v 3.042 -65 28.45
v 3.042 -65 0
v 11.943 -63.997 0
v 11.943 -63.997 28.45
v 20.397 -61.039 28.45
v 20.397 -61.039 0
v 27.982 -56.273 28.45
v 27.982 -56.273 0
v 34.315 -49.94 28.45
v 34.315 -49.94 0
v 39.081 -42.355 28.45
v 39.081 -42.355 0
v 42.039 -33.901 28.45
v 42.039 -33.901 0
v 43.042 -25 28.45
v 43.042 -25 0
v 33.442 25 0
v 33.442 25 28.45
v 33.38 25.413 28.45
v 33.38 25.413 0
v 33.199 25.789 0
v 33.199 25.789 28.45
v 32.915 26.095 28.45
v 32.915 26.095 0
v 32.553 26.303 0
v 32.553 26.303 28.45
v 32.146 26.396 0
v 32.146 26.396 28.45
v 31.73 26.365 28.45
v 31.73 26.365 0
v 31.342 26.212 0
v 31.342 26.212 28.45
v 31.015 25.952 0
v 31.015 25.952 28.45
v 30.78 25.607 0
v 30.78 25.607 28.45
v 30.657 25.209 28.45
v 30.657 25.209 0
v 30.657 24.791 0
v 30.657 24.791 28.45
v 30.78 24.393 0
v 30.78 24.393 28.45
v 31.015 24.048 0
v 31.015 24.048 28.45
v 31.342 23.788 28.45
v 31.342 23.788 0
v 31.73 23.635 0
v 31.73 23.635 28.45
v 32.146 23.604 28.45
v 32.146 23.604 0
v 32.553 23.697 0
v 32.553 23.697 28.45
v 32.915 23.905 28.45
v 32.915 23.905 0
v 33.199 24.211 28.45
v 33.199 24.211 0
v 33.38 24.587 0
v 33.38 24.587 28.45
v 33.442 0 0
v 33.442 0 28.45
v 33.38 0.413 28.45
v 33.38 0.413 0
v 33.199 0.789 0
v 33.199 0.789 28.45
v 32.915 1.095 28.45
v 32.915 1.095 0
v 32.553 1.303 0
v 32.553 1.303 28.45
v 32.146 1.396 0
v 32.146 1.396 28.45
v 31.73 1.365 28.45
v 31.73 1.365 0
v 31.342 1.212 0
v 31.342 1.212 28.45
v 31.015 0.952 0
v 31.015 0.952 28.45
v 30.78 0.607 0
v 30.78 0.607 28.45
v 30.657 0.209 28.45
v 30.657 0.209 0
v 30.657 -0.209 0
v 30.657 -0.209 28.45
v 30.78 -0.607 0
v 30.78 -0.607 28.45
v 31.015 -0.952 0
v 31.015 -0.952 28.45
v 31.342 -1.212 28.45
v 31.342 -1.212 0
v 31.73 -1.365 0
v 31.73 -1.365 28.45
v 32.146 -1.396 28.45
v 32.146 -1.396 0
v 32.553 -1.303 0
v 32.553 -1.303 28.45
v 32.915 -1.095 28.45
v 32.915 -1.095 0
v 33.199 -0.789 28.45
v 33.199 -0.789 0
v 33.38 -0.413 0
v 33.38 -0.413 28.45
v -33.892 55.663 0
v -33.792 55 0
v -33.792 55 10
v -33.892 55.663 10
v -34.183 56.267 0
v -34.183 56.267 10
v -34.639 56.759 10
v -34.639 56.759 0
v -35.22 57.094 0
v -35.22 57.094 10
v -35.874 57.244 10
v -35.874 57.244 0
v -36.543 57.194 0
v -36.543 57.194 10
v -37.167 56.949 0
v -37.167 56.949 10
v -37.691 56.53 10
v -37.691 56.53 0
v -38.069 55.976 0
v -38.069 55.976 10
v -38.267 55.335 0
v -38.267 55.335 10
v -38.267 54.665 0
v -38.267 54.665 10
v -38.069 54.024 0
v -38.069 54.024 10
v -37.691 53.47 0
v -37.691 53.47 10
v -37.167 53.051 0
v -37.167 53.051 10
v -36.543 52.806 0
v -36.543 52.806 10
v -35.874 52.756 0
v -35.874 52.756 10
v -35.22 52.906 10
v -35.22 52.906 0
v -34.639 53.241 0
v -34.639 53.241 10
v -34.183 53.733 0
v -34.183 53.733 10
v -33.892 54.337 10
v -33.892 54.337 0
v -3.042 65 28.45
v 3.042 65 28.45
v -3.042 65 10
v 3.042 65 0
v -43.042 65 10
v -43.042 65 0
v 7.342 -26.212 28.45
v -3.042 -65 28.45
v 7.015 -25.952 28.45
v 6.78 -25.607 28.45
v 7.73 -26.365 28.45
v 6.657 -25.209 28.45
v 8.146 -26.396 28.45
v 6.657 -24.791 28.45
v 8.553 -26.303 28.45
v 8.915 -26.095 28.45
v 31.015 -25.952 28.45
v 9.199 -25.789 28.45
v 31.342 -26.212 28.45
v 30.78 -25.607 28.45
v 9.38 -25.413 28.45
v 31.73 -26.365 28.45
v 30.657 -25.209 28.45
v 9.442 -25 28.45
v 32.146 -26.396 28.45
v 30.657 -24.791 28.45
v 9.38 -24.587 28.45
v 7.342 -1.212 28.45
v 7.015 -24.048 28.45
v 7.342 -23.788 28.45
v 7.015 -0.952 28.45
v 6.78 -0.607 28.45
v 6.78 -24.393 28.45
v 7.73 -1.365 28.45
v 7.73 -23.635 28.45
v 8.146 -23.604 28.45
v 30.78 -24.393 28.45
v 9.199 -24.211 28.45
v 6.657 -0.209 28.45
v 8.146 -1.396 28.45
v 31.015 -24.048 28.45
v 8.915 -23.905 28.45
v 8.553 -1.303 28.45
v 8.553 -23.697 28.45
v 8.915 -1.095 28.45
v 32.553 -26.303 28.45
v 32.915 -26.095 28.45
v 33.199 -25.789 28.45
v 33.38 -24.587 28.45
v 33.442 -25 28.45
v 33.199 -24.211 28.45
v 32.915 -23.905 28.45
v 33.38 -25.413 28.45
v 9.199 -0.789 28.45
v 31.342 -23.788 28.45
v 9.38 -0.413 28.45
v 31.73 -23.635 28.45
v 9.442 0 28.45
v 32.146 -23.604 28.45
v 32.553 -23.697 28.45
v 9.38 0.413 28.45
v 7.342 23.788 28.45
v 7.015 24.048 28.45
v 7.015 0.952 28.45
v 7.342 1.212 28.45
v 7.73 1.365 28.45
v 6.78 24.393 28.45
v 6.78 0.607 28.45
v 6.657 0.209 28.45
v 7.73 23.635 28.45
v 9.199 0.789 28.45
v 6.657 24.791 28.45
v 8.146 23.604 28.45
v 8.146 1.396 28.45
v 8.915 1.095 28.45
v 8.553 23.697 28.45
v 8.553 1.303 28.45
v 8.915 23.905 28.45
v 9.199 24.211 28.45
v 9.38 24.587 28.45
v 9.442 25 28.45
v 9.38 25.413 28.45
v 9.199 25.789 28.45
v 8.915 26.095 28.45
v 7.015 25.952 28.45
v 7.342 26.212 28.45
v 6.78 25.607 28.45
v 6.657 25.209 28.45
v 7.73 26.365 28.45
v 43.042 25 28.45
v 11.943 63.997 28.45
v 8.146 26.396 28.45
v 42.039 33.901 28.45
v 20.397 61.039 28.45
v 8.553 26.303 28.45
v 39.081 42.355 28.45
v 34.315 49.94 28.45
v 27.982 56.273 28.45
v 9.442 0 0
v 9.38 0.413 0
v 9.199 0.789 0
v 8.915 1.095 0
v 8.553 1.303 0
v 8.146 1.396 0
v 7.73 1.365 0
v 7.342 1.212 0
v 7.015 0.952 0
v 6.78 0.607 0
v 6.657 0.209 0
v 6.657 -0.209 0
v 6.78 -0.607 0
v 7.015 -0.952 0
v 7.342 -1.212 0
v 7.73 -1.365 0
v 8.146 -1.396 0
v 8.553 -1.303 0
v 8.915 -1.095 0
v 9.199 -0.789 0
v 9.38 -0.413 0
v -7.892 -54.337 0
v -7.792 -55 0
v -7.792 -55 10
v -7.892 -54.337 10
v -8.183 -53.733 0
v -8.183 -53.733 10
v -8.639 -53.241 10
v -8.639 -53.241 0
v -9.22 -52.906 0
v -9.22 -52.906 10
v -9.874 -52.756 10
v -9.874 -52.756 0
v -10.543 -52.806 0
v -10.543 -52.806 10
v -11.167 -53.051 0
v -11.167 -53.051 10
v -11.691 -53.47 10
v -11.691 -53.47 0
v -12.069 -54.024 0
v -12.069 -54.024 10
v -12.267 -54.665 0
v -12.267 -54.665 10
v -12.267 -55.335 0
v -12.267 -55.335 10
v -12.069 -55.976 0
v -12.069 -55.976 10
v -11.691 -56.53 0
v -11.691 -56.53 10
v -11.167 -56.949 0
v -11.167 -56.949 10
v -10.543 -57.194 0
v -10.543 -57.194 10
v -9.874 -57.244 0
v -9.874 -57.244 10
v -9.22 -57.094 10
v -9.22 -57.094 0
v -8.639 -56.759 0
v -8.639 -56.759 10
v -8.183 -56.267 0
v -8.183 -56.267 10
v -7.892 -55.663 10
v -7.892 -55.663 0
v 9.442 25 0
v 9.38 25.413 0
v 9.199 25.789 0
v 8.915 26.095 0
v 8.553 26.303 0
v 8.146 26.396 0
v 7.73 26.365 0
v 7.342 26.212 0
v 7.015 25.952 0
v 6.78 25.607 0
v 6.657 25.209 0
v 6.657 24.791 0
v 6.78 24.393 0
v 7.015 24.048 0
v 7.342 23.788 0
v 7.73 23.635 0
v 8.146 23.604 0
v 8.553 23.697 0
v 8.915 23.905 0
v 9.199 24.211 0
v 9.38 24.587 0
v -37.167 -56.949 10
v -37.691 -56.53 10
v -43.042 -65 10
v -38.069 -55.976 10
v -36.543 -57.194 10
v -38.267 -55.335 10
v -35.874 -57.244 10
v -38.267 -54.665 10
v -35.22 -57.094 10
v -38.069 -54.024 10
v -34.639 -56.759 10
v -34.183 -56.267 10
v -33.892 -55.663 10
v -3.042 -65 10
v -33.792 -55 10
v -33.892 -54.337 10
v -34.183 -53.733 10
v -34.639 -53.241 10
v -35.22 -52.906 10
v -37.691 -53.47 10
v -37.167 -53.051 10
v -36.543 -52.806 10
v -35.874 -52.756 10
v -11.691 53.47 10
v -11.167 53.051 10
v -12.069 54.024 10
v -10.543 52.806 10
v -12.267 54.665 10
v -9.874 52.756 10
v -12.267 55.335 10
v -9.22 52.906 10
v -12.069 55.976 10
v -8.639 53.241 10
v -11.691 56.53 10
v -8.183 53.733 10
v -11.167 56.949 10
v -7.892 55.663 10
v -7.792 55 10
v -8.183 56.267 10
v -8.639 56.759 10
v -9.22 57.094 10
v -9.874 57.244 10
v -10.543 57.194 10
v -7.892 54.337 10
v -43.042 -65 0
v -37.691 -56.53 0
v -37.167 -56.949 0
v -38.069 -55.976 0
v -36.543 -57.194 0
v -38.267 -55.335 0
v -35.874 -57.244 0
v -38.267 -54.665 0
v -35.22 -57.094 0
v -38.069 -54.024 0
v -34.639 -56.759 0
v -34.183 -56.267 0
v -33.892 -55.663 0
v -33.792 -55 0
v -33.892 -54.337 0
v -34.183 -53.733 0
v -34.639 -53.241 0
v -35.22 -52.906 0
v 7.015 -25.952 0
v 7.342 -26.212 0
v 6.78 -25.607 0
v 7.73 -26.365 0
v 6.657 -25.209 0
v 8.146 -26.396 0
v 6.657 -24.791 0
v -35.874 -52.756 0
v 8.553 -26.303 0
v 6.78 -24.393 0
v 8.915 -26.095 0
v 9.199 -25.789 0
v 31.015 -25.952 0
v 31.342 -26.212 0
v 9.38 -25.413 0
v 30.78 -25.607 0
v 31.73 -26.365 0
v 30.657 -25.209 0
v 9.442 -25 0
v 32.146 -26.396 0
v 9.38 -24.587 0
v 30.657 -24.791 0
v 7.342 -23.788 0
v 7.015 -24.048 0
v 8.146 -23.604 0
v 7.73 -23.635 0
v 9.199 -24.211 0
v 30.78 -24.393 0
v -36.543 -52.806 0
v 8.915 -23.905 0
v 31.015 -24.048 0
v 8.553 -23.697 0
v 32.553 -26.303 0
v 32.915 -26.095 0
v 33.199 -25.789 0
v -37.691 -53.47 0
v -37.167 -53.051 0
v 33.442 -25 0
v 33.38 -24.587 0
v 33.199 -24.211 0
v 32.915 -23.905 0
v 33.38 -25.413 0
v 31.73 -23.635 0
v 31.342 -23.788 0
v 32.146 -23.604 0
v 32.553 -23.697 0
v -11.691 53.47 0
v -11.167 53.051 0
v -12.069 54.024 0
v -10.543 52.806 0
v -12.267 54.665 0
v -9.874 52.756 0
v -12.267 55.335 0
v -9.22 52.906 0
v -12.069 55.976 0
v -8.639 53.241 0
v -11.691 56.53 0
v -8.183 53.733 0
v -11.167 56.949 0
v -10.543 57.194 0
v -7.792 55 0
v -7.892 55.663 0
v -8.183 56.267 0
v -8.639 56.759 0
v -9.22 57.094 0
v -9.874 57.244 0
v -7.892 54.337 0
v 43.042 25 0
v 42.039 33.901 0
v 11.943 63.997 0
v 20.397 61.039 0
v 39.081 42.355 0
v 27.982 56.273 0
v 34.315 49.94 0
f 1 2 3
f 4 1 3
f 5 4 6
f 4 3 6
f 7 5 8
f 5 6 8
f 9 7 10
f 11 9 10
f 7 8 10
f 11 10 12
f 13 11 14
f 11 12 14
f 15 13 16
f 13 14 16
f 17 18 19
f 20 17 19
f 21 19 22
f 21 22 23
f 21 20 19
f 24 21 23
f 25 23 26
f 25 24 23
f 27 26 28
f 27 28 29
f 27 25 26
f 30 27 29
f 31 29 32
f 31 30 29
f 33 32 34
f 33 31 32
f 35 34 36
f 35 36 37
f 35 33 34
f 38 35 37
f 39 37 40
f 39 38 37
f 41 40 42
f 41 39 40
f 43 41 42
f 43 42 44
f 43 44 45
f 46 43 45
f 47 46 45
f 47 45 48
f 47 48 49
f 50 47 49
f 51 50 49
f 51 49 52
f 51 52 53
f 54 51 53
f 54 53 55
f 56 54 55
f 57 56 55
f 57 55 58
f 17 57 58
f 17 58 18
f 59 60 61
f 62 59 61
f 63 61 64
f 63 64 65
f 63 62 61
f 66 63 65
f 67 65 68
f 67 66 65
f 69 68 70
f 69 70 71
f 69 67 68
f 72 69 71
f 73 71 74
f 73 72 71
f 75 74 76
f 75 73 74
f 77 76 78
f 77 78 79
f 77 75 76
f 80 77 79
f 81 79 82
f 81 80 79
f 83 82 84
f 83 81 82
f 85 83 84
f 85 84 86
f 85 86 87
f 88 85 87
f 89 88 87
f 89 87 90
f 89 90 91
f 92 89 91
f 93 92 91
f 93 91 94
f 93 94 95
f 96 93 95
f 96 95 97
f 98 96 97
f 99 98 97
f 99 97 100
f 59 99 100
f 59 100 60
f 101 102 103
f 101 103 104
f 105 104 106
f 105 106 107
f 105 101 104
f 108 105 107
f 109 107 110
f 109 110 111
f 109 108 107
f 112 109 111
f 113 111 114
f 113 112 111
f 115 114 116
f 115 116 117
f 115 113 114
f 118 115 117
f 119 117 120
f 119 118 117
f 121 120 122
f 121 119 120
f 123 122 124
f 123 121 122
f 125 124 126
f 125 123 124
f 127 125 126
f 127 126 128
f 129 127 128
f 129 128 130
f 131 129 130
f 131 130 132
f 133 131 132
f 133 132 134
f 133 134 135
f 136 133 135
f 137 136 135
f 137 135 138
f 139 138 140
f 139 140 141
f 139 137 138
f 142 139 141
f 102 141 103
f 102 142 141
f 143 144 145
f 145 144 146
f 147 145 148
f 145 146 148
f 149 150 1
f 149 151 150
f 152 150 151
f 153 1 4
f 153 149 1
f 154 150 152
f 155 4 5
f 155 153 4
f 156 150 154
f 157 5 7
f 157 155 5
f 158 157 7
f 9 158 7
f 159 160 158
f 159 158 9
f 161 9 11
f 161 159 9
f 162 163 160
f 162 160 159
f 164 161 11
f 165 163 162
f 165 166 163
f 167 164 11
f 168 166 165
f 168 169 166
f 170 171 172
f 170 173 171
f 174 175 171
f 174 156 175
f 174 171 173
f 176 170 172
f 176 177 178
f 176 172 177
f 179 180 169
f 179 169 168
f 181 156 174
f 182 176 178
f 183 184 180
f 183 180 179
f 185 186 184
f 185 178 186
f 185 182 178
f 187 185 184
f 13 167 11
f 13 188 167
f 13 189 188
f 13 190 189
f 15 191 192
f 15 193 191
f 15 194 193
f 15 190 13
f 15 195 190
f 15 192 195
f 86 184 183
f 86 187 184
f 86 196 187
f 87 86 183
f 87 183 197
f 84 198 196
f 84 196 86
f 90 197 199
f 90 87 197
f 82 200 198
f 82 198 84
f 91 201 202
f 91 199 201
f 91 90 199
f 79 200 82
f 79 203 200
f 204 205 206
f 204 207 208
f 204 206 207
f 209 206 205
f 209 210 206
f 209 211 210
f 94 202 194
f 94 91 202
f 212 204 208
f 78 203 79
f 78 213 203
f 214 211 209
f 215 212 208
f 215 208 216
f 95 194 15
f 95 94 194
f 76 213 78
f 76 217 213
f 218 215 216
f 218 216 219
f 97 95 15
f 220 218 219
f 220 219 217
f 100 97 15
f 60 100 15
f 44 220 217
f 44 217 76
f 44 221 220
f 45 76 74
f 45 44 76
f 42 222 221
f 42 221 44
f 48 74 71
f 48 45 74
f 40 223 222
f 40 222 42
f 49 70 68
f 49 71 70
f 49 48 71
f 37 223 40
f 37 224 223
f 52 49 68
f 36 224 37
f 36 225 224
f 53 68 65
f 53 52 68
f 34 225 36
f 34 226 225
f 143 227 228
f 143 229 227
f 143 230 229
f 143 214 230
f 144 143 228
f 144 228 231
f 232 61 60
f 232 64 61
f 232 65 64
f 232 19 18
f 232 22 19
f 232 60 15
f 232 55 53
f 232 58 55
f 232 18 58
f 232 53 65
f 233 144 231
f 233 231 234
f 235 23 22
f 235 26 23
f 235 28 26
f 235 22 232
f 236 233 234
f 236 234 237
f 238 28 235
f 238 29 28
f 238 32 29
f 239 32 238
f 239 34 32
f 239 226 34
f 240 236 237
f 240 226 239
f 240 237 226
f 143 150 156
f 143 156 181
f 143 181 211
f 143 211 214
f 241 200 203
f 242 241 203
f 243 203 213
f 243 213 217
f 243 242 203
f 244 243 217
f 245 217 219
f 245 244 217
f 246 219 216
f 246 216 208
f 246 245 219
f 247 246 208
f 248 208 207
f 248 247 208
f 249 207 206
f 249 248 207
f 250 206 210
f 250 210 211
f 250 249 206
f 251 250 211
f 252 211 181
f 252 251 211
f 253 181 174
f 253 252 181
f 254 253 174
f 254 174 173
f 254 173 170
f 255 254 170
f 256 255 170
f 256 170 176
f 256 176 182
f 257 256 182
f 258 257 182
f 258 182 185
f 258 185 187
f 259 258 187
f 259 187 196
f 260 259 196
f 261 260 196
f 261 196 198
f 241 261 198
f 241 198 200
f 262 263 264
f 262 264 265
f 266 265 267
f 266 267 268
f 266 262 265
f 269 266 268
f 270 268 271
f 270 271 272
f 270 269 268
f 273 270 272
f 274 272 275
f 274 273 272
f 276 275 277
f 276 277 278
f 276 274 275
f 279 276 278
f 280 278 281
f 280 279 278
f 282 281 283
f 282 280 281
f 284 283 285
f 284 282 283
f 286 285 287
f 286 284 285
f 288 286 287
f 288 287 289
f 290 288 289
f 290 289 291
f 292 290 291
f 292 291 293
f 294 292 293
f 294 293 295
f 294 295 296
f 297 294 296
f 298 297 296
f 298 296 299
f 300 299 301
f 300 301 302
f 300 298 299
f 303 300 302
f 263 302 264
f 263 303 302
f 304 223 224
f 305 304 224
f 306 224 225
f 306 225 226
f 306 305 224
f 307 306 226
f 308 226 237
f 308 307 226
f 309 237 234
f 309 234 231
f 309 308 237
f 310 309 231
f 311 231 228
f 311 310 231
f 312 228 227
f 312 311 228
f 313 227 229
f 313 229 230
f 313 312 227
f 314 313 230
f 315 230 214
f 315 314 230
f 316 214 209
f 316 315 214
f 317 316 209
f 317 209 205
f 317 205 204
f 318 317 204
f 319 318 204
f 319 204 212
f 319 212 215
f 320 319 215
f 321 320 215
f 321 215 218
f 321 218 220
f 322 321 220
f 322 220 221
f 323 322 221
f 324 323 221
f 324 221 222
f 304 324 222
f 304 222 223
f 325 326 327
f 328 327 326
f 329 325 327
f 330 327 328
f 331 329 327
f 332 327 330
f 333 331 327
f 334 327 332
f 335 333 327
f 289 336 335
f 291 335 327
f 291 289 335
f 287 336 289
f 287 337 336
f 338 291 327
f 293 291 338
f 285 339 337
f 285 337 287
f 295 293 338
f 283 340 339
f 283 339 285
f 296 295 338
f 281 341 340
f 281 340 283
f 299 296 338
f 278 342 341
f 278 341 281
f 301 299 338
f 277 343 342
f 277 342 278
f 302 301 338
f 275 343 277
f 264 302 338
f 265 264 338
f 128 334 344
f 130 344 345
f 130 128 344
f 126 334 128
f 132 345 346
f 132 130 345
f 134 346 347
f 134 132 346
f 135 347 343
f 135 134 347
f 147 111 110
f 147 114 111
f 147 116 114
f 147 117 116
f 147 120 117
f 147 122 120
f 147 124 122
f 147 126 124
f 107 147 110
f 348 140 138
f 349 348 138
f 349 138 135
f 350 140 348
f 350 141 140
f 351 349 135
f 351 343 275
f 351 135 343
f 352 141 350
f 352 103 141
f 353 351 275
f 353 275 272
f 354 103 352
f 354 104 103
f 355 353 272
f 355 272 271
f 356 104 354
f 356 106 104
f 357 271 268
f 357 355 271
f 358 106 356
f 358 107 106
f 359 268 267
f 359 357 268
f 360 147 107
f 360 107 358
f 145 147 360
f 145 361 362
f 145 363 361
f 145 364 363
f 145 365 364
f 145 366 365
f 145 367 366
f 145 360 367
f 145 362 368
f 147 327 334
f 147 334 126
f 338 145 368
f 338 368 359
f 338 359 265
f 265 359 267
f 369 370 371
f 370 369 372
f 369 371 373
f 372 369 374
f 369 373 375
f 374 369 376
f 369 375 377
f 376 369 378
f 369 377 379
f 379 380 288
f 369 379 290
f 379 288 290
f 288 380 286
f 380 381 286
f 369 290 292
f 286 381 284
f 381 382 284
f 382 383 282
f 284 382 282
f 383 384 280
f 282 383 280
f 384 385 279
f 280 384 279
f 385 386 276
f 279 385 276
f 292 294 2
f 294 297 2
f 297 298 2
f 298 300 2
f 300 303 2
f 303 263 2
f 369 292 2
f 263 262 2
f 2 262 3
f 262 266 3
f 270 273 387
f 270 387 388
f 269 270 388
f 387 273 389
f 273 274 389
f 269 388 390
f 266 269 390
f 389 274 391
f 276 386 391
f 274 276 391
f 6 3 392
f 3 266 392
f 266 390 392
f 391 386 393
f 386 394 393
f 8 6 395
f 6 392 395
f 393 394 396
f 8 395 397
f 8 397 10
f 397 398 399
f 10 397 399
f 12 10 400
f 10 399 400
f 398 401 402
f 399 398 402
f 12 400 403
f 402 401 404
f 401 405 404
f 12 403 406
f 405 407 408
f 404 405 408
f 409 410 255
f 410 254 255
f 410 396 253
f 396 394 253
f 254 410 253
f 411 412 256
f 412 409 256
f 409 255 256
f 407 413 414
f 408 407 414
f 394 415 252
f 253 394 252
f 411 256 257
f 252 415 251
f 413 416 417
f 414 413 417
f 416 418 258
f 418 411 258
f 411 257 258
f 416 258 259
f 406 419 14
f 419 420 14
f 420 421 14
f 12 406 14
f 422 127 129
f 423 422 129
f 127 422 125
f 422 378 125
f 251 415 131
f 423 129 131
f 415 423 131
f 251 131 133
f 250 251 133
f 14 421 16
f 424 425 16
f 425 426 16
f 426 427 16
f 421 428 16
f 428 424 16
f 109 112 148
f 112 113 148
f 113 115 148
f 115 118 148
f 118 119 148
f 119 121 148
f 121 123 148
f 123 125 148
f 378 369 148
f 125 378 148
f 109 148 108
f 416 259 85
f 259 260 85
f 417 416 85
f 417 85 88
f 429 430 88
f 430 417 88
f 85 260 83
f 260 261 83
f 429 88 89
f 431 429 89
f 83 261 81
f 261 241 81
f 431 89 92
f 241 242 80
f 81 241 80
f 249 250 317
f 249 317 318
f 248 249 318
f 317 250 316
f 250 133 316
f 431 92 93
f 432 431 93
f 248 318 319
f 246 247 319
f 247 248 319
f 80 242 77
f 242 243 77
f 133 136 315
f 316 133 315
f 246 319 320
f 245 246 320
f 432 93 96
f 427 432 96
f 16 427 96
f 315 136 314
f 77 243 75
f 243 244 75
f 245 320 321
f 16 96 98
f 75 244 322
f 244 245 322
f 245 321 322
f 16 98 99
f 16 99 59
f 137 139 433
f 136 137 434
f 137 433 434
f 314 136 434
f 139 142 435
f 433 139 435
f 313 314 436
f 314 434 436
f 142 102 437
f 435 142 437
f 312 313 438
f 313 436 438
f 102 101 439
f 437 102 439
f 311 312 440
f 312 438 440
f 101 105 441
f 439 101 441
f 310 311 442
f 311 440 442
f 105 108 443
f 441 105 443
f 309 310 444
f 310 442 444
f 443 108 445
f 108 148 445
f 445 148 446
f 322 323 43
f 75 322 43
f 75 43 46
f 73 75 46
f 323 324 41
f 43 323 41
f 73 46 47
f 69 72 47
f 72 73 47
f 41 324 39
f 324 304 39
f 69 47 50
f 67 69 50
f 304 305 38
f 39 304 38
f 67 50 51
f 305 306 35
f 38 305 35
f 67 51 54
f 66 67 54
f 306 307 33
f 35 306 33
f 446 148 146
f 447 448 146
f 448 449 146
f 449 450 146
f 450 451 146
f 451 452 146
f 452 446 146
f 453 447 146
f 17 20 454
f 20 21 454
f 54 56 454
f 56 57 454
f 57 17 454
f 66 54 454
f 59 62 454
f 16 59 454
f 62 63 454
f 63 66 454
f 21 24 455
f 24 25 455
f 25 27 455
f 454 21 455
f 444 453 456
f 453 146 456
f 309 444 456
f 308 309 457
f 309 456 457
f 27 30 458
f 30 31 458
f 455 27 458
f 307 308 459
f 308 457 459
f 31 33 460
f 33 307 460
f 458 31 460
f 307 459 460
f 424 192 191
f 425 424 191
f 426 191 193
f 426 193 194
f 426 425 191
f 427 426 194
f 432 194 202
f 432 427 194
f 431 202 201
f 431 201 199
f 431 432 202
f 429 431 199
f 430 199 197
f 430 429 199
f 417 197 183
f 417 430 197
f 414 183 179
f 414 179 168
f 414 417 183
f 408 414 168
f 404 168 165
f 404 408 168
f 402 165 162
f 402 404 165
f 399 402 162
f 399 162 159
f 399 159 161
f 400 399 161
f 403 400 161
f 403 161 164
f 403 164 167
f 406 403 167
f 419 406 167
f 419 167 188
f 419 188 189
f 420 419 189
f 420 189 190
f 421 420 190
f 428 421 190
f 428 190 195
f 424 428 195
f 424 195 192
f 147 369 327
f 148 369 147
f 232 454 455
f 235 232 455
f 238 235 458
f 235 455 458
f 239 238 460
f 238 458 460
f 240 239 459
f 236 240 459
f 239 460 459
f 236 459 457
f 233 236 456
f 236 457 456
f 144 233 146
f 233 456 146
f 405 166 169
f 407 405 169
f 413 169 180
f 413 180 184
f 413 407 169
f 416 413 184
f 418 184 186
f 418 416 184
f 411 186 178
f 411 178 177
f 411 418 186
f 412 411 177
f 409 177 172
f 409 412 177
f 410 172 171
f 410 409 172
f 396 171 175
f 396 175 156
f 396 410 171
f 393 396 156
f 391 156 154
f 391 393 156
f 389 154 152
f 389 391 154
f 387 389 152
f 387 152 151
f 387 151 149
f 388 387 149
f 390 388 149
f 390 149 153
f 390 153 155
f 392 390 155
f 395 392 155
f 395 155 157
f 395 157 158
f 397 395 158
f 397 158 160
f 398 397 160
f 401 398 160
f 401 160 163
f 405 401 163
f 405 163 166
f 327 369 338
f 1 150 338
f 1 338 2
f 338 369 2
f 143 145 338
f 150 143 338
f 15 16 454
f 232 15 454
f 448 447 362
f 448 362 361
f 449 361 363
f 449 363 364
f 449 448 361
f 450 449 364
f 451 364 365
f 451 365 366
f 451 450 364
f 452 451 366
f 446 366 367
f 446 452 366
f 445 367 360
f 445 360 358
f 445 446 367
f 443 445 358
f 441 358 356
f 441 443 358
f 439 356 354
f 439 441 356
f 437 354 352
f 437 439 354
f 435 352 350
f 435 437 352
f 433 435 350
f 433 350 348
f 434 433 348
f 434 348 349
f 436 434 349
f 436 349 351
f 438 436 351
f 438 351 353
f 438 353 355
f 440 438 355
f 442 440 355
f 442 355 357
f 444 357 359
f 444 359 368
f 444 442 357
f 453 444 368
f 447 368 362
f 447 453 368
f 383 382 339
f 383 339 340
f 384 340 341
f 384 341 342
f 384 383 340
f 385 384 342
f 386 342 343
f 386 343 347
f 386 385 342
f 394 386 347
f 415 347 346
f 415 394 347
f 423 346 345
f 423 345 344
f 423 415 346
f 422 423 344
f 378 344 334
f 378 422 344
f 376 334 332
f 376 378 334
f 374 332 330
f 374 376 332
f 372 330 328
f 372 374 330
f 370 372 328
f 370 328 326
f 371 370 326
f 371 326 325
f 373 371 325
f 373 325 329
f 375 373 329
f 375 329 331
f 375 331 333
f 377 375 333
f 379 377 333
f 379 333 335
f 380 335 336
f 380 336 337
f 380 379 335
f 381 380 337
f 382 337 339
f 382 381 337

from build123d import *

# Parameters (mm, degrees)
SKETCH1_R           = 1.4
SKETCH1_R_2         = 2.25
BOSS_EXTRUDE1_DEPTH = 10
SKETCH1_3_R         = 1.4
BOSS_EXTRUDE2_DEPTH = 28.45


with BuildPart() as part:
    # Sketch1 → Boss-Extrude1 (new body)
    with BuildSketch(Plane.XY):
        with BuildLine():
            ThreePointArc((3.042, -65.000000484), (31.326271247, -53.284271732), (43.042, -25.000000484))
            Line((43.042, -25.000000484), (43.042, 25.000000484))
            ThreePointArc((43.042, 25.000000484), (31.326271247, 53.284271732), (3.042, 65.000000484))
            Line((3.042, 65.000000484), (-43.042, 65.000000484))
            Line((-43.042, 65.000000484), (-43.042, -65.000000484))
            Line((-43.042, -65.000000484), (3.042, -65.000000484))
        make_face()
        with Locations((8.041768895, -25.000000484)):
            Circle(SKETCH1_R, mode=Mode.SUBTRACT)
        with Locations((32.041768895, -25.000000484)):
            Circle(SKETCH1_R, mode=Mode.SUBTRACT)
        with Locations((8.041768895, 0)):
            Circle(SKETCH1_R, mode=Mode.SUBTRACT)
        with Locations((8.041768895, 25.000000484)):
            Circle(SKETCH1_R, mode=Mode.SUBTRACT)
        with Locations((32.041768895, 0)):
            Circle(SKETCH1_R, mode=Mode.SUBTRACT)
        with Locations((32.041768895, 25.000000484)):
            Circle(SKETCH1_R, mode=Mode.SUBTRACT)
        with Locations((-10.042, 55.000000484)):
            Circle(SKETCH1_R_2, mode=Mode.SUBTRACT)
        with Locations((-36.042, -54.999999516)):
            Circle(SKETCH1_R_2, mode=Mode.SUBTRACT)
        with Locations((-10.042, -54.999999516)):
            Circle(SKETCH1_R_2, mode=Mode.SUBTRACT)
        with Locations((-36.042, 55.000000484)):
            Circle(SKETCH1_R_2, mode=Mode.SUBTRACT)
    extrude(amount=BOSS_EXTRUDE1_DEPTH)

    # Sketch1<3> → Boss-Extrude2 (add)
    with BuildSketch(Plane.XY):
        with BuildLine():
            ThreePointArc((3.042, -65.000000484), (31.326271247, -53.284271732), (43.042, -25.000000484))
            Line((43.042, -25.000000484), (43.042, 25.000000484))
            ThreePointArc((43.042, 25.000000484), (31.326271247, 53.284271732), (3.042, 65.000000484))
            Line((3.042, 65.000000484), (-3.042, 65.000000484))
            Line((-3.042, 65.000000484), (-3.042, -65.000000484))
            Line((-3.042, -65.000000484), (3.042, -65.000000484))
        make_face()
        with Locations((8.041768895, -25.000000484)):
            Circle(SKETCH1_3_R, mode=Mode.SUBTRACT)
        with Locations((32.041768895, -25.000000484)):
            Circle(SKETCH1_3_R, mode=Mode.SUBTRACT)
        with Locations((8.041768895, 0)):
            Circle(SKETCH1_3_R, mode=Mode.SUBTRACT)
        with Locations((8.041768895, 25.000000484)):
            Circle(SKETCH1_3_R, mode=Mode.SUBTRACT)
        with Locations((32.041768895, 0)):
            Circle(SKETCH1_3_R, mode=Mode.SUBTRACT)
        with Locations((32.041768895, 25.000000484)):
            Circle(SKETCH1_3_R, mode=Mode.SUBTRACT)
    extrude(amount=BOSS_EXTRUDE2_DEPTH)


solid = part.part
